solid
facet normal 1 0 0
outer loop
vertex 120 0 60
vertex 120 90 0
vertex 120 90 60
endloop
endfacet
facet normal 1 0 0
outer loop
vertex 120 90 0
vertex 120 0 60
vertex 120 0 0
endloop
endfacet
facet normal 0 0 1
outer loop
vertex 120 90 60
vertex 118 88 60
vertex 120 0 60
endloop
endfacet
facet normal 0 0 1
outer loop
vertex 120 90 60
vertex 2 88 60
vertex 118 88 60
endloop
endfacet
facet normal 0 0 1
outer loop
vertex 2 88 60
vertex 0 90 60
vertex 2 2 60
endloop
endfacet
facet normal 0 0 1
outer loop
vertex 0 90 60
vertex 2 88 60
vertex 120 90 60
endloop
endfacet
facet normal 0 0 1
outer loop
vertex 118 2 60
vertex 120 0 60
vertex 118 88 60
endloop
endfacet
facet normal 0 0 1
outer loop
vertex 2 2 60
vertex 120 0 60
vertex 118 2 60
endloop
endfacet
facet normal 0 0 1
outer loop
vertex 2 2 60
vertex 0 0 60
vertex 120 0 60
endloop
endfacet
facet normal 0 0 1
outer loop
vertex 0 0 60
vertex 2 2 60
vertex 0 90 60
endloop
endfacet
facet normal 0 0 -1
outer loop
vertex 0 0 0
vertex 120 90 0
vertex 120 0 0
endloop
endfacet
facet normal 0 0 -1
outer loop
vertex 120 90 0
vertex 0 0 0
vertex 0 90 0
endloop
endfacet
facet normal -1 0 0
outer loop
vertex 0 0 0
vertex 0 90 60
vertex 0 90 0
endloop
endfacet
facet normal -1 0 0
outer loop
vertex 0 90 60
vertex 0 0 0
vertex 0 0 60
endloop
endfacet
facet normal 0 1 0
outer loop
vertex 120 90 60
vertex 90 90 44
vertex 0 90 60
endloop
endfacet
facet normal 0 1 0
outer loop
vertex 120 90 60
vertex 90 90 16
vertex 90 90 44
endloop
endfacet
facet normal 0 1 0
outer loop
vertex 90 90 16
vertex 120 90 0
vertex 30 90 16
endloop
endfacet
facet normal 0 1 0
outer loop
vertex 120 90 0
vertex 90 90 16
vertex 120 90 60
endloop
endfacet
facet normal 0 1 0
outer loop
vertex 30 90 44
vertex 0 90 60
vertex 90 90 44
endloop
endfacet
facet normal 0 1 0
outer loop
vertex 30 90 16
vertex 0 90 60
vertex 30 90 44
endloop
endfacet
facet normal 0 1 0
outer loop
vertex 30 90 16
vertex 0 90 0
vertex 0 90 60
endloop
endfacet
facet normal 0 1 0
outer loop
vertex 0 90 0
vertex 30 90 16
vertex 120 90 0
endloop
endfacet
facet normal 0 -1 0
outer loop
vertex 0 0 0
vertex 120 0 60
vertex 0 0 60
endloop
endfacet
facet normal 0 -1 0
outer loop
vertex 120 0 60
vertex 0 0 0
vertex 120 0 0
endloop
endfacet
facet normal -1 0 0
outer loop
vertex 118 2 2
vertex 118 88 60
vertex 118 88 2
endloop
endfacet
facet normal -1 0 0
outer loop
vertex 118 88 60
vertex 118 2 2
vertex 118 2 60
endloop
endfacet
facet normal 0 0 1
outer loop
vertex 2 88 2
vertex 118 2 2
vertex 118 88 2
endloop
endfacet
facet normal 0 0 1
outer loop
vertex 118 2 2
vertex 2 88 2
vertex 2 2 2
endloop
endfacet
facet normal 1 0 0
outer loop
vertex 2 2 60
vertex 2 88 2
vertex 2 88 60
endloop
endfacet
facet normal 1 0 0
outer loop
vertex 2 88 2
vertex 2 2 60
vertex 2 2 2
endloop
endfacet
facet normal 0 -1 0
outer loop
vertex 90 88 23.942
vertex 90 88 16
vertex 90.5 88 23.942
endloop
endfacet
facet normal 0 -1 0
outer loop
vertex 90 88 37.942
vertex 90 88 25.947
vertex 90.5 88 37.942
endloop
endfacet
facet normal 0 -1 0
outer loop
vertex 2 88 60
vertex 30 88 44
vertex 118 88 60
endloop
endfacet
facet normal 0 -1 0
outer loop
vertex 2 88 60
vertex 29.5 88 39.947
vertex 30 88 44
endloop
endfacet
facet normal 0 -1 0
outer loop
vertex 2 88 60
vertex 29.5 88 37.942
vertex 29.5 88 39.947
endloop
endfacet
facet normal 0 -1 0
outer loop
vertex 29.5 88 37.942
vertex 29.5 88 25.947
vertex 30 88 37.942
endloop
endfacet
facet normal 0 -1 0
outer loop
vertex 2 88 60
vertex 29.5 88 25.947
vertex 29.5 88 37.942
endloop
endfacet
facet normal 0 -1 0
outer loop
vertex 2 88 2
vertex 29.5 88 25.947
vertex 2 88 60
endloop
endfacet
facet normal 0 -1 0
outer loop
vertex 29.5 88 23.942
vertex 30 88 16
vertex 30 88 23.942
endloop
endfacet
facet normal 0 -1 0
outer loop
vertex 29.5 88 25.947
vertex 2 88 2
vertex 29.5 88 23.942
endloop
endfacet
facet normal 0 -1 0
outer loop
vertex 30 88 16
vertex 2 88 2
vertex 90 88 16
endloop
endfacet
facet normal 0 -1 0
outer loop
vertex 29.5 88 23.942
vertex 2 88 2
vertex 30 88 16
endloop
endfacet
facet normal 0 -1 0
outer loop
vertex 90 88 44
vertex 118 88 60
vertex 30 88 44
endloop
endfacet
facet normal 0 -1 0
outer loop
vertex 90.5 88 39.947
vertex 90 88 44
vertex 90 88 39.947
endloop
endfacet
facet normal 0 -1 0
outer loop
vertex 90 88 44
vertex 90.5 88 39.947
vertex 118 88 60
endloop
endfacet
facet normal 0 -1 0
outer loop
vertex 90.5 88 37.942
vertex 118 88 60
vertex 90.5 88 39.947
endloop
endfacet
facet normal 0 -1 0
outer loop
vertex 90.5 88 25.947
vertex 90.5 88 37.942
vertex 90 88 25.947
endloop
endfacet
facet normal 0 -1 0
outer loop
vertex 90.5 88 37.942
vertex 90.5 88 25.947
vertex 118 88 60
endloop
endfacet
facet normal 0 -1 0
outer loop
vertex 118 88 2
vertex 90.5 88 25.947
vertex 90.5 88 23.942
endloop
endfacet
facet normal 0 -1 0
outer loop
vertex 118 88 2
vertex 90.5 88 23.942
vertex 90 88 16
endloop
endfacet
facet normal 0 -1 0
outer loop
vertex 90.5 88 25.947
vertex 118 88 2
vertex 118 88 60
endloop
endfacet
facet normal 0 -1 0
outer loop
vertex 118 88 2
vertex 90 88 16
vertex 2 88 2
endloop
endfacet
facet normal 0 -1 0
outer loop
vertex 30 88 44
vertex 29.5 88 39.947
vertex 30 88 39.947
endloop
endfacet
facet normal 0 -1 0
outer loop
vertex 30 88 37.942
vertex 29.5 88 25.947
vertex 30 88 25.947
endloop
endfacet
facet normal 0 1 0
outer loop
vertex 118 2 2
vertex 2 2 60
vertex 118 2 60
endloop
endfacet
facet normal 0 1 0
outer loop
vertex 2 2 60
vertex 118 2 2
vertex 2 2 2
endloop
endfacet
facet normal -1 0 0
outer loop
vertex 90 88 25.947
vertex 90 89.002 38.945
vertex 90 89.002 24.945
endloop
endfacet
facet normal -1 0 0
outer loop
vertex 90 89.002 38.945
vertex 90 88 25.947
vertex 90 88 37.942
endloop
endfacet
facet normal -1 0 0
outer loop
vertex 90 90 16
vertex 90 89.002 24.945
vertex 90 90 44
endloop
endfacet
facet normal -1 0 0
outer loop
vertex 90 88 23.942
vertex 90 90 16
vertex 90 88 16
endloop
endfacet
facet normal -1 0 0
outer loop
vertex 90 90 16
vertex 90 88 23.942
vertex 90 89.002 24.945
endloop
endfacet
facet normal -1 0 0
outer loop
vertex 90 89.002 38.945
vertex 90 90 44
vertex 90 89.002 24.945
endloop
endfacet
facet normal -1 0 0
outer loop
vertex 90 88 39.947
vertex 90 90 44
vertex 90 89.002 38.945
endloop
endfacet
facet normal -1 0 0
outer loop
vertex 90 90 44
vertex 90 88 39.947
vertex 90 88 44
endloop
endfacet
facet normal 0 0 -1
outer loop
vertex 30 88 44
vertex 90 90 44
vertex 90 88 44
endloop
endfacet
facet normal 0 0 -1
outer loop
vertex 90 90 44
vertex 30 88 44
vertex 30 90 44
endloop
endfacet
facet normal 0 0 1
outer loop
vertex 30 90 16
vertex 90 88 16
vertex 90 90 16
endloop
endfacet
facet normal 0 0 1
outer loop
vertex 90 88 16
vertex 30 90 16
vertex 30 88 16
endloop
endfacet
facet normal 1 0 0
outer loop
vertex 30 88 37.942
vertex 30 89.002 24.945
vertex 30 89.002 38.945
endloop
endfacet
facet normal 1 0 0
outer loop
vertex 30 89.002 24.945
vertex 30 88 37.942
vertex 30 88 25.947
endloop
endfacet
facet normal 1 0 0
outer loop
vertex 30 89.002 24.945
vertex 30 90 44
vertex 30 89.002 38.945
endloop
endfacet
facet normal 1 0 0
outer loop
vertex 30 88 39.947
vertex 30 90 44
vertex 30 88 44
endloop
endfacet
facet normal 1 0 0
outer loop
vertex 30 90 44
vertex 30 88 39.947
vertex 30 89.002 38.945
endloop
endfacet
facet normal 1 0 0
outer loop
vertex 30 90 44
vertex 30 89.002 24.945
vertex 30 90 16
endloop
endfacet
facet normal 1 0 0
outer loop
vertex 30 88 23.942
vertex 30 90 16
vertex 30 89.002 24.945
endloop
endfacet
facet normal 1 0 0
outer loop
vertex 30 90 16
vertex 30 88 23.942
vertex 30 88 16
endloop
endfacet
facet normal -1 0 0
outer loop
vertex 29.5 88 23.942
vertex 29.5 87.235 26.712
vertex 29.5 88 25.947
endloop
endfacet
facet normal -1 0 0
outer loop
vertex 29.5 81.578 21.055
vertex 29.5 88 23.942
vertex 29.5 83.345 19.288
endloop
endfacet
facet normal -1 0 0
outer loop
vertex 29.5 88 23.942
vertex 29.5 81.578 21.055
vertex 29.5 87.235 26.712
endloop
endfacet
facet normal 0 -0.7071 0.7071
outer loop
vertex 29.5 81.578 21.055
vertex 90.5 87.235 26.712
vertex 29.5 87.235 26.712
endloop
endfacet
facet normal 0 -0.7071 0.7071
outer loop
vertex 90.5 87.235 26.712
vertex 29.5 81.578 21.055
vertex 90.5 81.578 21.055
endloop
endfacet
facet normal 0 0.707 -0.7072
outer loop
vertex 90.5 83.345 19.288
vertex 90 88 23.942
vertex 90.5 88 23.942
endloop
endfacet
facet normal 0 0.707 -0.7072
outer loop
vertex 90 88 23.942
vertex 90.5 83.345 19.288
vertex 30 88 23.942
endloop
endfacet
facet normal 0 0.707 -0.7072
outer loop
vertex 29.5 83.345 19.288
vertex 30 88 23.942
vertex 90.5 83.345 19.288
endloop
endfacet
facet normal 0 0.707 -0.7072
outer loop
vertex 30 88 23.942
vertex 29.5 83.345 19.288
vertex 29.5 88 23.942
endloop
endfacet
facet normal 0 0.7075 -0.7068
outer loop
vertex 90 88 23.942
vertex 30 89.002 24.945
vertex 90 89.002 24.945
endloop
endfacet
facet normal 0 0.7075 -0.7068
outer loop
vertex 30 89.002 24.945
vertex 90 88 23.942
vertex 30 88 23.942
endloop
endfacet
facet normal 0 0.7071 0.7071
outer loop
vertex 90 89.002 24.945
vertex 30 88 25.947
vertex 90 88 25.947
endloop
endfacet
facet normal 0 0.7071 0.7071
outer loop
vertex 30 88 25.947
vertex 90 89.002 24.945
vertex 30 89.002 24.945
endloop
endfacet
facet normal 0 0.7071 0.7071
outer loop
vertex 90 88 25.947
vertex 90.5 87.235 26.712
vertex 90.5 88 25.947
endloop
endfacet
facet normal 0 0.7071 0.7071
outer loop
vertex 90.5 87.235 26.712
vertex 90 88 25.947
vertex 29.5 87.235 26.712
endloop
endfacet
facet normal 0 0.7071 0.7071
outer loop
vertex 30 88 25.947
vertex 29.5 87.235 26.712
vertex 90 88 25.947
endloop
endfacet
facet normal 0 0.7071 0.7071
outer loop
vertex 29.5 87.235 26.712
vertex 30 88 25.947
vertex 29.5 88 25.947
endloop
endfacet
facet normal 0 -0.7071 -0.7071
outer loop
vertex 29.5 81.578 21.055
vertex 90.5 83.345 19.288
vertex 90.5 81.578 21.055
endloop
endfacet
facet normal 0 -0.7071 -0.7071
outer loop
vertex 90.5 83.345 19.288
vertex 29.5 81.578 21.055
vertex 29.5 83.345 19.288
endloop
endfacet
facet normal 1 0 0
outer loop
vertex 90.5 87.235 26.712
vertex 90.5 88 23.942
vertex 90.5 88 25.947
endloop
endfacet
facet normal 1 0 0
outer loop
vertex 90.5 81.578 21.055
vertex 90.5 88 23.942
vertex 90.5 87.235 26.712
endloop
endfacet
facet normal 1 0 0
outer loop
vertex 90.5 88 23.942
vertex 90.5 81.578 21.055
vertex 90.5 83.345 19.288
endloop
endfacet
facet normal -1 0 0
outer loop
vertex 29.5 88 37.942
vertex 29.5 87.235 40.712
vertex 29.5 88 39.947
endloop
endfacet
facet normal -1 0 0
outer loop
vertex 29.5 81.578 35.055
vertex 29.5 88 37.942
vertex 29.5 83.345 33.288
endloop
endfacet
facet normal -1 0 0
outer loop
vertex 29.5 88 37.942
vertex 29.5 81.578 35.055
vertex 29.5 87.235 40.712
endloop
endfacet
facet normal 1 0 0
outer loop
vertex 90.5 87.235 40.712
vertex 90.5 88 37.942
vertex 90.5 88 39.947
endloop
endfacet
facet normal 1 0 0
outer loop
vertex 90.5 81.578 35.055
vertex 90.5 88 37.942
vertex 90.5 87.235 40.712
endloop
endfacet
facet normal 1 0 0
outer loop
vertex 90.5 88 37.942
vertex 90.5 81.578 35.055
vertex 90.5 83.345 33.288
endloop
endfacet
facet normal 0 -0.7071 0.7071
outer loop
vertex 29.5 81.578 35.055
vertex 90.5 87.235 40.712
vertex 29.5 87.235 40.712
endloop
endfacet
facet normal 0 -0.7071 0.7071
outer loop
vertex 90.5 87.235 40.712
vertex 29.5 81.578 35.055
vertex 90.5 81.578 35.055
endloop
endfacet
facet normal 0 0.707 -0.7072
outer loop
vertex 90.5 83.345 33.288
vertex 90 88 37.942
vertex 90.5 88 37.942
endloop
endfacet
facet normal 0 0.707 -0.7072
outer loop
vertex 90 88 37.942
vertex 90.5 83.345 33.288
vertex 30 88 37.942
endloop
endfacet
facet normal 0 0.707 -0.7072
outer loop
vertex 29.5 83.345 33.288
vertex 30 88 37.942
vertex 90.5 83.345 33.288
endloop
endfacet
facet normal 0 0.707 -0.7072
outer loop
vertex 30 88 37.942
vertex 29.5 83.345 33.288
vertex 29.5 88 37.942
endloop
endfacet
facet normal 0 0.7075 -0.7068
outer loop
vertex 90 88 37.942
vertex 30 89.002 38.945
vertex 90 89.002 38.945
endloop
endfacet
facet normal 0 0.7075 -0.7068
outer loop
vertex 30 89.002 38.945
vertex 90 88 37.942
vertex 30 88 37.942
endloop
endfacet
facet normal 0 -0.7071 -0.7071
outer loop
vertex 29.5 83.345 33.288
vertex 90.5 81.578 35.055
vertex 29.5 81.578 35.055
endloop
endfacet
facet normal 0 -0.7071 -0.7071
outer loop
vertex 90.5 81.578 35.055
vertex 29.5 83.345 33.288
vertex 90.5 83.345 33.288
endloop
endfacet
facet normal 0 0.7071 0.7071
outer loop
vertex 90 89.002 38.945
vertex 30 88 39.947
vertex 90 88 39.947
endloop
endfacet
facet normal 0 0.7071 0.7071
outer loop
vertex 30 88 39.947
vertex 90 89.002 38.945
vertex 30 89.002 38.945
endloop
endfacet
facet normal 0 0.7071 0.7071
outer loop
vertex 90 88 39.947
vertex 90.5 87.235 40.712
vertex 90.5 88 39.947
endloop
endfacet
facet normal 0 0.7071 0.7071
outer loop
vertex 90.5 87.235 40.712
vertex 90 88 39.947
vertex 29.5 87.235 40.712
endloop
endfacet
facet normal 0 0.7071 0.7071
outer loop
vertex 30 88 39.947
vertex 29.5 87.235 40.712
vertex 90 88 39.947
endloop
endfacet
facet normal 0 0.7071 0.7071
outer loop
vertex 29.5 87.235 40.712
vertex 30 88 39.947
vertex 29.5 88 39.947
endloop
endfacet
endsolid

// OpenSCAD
$fn = 32;

// ----------------------------------------------------------------------
// Vent box: louvers enclosure
// ----------------------------------------------------------------------

// --- parameters (mm) ---
box_l = 120;              // box length, X
box_w = 90;               // box width, Y
box_h = 60;               // box height, Z
wall_t = 2;               // shell wall thickness
win_l = 60;               // vent window width, X
win_h = 28;               // vent window height, Z
slat_t = 2.5;             // louver slat thickness
slat_d = 8;               // louver slat depth
slat_a = 45;              // louver slat angle, degrees
slat_pitch = 14;          // louver pitch
slat_yc = 85.29;          // slat centreline Y
fit_tol = 0.02;           // tolerance for press fits, mm
free_tol = 0.2;           // tolerance for clearance fits, mm

win_z0 = (box_h - win_h) / 2;  // window lower edge Z
n_slats = 2;  // louver count
slat_z0 = win_z0 + (win_h - (n_slats - 1) * slat_pitch) / 2;

difference() {
  union() {
    difference() {
      cube([box_l, box_w, box_h]);
  translate([wall_t, wall_t, wall_t])
    cube([box_l - 2 * wall_t, box_w - 2 * wall_t, box_h]);
  translate([(box_l - win_l) / 2, box_w - wall_t - 1, win_z0])
    cube([win_l, wall_t + 2, win_h]);
    }
    for (i = [0 : n_slats - 1])
      translate([box_l / 2, slat_yc, slat_z0 + i * slat_pitch])
        rotate([slat_a, 0, 0])
          cube([win_l + 1, slat_d, slat_t], center = true);
  }
}
